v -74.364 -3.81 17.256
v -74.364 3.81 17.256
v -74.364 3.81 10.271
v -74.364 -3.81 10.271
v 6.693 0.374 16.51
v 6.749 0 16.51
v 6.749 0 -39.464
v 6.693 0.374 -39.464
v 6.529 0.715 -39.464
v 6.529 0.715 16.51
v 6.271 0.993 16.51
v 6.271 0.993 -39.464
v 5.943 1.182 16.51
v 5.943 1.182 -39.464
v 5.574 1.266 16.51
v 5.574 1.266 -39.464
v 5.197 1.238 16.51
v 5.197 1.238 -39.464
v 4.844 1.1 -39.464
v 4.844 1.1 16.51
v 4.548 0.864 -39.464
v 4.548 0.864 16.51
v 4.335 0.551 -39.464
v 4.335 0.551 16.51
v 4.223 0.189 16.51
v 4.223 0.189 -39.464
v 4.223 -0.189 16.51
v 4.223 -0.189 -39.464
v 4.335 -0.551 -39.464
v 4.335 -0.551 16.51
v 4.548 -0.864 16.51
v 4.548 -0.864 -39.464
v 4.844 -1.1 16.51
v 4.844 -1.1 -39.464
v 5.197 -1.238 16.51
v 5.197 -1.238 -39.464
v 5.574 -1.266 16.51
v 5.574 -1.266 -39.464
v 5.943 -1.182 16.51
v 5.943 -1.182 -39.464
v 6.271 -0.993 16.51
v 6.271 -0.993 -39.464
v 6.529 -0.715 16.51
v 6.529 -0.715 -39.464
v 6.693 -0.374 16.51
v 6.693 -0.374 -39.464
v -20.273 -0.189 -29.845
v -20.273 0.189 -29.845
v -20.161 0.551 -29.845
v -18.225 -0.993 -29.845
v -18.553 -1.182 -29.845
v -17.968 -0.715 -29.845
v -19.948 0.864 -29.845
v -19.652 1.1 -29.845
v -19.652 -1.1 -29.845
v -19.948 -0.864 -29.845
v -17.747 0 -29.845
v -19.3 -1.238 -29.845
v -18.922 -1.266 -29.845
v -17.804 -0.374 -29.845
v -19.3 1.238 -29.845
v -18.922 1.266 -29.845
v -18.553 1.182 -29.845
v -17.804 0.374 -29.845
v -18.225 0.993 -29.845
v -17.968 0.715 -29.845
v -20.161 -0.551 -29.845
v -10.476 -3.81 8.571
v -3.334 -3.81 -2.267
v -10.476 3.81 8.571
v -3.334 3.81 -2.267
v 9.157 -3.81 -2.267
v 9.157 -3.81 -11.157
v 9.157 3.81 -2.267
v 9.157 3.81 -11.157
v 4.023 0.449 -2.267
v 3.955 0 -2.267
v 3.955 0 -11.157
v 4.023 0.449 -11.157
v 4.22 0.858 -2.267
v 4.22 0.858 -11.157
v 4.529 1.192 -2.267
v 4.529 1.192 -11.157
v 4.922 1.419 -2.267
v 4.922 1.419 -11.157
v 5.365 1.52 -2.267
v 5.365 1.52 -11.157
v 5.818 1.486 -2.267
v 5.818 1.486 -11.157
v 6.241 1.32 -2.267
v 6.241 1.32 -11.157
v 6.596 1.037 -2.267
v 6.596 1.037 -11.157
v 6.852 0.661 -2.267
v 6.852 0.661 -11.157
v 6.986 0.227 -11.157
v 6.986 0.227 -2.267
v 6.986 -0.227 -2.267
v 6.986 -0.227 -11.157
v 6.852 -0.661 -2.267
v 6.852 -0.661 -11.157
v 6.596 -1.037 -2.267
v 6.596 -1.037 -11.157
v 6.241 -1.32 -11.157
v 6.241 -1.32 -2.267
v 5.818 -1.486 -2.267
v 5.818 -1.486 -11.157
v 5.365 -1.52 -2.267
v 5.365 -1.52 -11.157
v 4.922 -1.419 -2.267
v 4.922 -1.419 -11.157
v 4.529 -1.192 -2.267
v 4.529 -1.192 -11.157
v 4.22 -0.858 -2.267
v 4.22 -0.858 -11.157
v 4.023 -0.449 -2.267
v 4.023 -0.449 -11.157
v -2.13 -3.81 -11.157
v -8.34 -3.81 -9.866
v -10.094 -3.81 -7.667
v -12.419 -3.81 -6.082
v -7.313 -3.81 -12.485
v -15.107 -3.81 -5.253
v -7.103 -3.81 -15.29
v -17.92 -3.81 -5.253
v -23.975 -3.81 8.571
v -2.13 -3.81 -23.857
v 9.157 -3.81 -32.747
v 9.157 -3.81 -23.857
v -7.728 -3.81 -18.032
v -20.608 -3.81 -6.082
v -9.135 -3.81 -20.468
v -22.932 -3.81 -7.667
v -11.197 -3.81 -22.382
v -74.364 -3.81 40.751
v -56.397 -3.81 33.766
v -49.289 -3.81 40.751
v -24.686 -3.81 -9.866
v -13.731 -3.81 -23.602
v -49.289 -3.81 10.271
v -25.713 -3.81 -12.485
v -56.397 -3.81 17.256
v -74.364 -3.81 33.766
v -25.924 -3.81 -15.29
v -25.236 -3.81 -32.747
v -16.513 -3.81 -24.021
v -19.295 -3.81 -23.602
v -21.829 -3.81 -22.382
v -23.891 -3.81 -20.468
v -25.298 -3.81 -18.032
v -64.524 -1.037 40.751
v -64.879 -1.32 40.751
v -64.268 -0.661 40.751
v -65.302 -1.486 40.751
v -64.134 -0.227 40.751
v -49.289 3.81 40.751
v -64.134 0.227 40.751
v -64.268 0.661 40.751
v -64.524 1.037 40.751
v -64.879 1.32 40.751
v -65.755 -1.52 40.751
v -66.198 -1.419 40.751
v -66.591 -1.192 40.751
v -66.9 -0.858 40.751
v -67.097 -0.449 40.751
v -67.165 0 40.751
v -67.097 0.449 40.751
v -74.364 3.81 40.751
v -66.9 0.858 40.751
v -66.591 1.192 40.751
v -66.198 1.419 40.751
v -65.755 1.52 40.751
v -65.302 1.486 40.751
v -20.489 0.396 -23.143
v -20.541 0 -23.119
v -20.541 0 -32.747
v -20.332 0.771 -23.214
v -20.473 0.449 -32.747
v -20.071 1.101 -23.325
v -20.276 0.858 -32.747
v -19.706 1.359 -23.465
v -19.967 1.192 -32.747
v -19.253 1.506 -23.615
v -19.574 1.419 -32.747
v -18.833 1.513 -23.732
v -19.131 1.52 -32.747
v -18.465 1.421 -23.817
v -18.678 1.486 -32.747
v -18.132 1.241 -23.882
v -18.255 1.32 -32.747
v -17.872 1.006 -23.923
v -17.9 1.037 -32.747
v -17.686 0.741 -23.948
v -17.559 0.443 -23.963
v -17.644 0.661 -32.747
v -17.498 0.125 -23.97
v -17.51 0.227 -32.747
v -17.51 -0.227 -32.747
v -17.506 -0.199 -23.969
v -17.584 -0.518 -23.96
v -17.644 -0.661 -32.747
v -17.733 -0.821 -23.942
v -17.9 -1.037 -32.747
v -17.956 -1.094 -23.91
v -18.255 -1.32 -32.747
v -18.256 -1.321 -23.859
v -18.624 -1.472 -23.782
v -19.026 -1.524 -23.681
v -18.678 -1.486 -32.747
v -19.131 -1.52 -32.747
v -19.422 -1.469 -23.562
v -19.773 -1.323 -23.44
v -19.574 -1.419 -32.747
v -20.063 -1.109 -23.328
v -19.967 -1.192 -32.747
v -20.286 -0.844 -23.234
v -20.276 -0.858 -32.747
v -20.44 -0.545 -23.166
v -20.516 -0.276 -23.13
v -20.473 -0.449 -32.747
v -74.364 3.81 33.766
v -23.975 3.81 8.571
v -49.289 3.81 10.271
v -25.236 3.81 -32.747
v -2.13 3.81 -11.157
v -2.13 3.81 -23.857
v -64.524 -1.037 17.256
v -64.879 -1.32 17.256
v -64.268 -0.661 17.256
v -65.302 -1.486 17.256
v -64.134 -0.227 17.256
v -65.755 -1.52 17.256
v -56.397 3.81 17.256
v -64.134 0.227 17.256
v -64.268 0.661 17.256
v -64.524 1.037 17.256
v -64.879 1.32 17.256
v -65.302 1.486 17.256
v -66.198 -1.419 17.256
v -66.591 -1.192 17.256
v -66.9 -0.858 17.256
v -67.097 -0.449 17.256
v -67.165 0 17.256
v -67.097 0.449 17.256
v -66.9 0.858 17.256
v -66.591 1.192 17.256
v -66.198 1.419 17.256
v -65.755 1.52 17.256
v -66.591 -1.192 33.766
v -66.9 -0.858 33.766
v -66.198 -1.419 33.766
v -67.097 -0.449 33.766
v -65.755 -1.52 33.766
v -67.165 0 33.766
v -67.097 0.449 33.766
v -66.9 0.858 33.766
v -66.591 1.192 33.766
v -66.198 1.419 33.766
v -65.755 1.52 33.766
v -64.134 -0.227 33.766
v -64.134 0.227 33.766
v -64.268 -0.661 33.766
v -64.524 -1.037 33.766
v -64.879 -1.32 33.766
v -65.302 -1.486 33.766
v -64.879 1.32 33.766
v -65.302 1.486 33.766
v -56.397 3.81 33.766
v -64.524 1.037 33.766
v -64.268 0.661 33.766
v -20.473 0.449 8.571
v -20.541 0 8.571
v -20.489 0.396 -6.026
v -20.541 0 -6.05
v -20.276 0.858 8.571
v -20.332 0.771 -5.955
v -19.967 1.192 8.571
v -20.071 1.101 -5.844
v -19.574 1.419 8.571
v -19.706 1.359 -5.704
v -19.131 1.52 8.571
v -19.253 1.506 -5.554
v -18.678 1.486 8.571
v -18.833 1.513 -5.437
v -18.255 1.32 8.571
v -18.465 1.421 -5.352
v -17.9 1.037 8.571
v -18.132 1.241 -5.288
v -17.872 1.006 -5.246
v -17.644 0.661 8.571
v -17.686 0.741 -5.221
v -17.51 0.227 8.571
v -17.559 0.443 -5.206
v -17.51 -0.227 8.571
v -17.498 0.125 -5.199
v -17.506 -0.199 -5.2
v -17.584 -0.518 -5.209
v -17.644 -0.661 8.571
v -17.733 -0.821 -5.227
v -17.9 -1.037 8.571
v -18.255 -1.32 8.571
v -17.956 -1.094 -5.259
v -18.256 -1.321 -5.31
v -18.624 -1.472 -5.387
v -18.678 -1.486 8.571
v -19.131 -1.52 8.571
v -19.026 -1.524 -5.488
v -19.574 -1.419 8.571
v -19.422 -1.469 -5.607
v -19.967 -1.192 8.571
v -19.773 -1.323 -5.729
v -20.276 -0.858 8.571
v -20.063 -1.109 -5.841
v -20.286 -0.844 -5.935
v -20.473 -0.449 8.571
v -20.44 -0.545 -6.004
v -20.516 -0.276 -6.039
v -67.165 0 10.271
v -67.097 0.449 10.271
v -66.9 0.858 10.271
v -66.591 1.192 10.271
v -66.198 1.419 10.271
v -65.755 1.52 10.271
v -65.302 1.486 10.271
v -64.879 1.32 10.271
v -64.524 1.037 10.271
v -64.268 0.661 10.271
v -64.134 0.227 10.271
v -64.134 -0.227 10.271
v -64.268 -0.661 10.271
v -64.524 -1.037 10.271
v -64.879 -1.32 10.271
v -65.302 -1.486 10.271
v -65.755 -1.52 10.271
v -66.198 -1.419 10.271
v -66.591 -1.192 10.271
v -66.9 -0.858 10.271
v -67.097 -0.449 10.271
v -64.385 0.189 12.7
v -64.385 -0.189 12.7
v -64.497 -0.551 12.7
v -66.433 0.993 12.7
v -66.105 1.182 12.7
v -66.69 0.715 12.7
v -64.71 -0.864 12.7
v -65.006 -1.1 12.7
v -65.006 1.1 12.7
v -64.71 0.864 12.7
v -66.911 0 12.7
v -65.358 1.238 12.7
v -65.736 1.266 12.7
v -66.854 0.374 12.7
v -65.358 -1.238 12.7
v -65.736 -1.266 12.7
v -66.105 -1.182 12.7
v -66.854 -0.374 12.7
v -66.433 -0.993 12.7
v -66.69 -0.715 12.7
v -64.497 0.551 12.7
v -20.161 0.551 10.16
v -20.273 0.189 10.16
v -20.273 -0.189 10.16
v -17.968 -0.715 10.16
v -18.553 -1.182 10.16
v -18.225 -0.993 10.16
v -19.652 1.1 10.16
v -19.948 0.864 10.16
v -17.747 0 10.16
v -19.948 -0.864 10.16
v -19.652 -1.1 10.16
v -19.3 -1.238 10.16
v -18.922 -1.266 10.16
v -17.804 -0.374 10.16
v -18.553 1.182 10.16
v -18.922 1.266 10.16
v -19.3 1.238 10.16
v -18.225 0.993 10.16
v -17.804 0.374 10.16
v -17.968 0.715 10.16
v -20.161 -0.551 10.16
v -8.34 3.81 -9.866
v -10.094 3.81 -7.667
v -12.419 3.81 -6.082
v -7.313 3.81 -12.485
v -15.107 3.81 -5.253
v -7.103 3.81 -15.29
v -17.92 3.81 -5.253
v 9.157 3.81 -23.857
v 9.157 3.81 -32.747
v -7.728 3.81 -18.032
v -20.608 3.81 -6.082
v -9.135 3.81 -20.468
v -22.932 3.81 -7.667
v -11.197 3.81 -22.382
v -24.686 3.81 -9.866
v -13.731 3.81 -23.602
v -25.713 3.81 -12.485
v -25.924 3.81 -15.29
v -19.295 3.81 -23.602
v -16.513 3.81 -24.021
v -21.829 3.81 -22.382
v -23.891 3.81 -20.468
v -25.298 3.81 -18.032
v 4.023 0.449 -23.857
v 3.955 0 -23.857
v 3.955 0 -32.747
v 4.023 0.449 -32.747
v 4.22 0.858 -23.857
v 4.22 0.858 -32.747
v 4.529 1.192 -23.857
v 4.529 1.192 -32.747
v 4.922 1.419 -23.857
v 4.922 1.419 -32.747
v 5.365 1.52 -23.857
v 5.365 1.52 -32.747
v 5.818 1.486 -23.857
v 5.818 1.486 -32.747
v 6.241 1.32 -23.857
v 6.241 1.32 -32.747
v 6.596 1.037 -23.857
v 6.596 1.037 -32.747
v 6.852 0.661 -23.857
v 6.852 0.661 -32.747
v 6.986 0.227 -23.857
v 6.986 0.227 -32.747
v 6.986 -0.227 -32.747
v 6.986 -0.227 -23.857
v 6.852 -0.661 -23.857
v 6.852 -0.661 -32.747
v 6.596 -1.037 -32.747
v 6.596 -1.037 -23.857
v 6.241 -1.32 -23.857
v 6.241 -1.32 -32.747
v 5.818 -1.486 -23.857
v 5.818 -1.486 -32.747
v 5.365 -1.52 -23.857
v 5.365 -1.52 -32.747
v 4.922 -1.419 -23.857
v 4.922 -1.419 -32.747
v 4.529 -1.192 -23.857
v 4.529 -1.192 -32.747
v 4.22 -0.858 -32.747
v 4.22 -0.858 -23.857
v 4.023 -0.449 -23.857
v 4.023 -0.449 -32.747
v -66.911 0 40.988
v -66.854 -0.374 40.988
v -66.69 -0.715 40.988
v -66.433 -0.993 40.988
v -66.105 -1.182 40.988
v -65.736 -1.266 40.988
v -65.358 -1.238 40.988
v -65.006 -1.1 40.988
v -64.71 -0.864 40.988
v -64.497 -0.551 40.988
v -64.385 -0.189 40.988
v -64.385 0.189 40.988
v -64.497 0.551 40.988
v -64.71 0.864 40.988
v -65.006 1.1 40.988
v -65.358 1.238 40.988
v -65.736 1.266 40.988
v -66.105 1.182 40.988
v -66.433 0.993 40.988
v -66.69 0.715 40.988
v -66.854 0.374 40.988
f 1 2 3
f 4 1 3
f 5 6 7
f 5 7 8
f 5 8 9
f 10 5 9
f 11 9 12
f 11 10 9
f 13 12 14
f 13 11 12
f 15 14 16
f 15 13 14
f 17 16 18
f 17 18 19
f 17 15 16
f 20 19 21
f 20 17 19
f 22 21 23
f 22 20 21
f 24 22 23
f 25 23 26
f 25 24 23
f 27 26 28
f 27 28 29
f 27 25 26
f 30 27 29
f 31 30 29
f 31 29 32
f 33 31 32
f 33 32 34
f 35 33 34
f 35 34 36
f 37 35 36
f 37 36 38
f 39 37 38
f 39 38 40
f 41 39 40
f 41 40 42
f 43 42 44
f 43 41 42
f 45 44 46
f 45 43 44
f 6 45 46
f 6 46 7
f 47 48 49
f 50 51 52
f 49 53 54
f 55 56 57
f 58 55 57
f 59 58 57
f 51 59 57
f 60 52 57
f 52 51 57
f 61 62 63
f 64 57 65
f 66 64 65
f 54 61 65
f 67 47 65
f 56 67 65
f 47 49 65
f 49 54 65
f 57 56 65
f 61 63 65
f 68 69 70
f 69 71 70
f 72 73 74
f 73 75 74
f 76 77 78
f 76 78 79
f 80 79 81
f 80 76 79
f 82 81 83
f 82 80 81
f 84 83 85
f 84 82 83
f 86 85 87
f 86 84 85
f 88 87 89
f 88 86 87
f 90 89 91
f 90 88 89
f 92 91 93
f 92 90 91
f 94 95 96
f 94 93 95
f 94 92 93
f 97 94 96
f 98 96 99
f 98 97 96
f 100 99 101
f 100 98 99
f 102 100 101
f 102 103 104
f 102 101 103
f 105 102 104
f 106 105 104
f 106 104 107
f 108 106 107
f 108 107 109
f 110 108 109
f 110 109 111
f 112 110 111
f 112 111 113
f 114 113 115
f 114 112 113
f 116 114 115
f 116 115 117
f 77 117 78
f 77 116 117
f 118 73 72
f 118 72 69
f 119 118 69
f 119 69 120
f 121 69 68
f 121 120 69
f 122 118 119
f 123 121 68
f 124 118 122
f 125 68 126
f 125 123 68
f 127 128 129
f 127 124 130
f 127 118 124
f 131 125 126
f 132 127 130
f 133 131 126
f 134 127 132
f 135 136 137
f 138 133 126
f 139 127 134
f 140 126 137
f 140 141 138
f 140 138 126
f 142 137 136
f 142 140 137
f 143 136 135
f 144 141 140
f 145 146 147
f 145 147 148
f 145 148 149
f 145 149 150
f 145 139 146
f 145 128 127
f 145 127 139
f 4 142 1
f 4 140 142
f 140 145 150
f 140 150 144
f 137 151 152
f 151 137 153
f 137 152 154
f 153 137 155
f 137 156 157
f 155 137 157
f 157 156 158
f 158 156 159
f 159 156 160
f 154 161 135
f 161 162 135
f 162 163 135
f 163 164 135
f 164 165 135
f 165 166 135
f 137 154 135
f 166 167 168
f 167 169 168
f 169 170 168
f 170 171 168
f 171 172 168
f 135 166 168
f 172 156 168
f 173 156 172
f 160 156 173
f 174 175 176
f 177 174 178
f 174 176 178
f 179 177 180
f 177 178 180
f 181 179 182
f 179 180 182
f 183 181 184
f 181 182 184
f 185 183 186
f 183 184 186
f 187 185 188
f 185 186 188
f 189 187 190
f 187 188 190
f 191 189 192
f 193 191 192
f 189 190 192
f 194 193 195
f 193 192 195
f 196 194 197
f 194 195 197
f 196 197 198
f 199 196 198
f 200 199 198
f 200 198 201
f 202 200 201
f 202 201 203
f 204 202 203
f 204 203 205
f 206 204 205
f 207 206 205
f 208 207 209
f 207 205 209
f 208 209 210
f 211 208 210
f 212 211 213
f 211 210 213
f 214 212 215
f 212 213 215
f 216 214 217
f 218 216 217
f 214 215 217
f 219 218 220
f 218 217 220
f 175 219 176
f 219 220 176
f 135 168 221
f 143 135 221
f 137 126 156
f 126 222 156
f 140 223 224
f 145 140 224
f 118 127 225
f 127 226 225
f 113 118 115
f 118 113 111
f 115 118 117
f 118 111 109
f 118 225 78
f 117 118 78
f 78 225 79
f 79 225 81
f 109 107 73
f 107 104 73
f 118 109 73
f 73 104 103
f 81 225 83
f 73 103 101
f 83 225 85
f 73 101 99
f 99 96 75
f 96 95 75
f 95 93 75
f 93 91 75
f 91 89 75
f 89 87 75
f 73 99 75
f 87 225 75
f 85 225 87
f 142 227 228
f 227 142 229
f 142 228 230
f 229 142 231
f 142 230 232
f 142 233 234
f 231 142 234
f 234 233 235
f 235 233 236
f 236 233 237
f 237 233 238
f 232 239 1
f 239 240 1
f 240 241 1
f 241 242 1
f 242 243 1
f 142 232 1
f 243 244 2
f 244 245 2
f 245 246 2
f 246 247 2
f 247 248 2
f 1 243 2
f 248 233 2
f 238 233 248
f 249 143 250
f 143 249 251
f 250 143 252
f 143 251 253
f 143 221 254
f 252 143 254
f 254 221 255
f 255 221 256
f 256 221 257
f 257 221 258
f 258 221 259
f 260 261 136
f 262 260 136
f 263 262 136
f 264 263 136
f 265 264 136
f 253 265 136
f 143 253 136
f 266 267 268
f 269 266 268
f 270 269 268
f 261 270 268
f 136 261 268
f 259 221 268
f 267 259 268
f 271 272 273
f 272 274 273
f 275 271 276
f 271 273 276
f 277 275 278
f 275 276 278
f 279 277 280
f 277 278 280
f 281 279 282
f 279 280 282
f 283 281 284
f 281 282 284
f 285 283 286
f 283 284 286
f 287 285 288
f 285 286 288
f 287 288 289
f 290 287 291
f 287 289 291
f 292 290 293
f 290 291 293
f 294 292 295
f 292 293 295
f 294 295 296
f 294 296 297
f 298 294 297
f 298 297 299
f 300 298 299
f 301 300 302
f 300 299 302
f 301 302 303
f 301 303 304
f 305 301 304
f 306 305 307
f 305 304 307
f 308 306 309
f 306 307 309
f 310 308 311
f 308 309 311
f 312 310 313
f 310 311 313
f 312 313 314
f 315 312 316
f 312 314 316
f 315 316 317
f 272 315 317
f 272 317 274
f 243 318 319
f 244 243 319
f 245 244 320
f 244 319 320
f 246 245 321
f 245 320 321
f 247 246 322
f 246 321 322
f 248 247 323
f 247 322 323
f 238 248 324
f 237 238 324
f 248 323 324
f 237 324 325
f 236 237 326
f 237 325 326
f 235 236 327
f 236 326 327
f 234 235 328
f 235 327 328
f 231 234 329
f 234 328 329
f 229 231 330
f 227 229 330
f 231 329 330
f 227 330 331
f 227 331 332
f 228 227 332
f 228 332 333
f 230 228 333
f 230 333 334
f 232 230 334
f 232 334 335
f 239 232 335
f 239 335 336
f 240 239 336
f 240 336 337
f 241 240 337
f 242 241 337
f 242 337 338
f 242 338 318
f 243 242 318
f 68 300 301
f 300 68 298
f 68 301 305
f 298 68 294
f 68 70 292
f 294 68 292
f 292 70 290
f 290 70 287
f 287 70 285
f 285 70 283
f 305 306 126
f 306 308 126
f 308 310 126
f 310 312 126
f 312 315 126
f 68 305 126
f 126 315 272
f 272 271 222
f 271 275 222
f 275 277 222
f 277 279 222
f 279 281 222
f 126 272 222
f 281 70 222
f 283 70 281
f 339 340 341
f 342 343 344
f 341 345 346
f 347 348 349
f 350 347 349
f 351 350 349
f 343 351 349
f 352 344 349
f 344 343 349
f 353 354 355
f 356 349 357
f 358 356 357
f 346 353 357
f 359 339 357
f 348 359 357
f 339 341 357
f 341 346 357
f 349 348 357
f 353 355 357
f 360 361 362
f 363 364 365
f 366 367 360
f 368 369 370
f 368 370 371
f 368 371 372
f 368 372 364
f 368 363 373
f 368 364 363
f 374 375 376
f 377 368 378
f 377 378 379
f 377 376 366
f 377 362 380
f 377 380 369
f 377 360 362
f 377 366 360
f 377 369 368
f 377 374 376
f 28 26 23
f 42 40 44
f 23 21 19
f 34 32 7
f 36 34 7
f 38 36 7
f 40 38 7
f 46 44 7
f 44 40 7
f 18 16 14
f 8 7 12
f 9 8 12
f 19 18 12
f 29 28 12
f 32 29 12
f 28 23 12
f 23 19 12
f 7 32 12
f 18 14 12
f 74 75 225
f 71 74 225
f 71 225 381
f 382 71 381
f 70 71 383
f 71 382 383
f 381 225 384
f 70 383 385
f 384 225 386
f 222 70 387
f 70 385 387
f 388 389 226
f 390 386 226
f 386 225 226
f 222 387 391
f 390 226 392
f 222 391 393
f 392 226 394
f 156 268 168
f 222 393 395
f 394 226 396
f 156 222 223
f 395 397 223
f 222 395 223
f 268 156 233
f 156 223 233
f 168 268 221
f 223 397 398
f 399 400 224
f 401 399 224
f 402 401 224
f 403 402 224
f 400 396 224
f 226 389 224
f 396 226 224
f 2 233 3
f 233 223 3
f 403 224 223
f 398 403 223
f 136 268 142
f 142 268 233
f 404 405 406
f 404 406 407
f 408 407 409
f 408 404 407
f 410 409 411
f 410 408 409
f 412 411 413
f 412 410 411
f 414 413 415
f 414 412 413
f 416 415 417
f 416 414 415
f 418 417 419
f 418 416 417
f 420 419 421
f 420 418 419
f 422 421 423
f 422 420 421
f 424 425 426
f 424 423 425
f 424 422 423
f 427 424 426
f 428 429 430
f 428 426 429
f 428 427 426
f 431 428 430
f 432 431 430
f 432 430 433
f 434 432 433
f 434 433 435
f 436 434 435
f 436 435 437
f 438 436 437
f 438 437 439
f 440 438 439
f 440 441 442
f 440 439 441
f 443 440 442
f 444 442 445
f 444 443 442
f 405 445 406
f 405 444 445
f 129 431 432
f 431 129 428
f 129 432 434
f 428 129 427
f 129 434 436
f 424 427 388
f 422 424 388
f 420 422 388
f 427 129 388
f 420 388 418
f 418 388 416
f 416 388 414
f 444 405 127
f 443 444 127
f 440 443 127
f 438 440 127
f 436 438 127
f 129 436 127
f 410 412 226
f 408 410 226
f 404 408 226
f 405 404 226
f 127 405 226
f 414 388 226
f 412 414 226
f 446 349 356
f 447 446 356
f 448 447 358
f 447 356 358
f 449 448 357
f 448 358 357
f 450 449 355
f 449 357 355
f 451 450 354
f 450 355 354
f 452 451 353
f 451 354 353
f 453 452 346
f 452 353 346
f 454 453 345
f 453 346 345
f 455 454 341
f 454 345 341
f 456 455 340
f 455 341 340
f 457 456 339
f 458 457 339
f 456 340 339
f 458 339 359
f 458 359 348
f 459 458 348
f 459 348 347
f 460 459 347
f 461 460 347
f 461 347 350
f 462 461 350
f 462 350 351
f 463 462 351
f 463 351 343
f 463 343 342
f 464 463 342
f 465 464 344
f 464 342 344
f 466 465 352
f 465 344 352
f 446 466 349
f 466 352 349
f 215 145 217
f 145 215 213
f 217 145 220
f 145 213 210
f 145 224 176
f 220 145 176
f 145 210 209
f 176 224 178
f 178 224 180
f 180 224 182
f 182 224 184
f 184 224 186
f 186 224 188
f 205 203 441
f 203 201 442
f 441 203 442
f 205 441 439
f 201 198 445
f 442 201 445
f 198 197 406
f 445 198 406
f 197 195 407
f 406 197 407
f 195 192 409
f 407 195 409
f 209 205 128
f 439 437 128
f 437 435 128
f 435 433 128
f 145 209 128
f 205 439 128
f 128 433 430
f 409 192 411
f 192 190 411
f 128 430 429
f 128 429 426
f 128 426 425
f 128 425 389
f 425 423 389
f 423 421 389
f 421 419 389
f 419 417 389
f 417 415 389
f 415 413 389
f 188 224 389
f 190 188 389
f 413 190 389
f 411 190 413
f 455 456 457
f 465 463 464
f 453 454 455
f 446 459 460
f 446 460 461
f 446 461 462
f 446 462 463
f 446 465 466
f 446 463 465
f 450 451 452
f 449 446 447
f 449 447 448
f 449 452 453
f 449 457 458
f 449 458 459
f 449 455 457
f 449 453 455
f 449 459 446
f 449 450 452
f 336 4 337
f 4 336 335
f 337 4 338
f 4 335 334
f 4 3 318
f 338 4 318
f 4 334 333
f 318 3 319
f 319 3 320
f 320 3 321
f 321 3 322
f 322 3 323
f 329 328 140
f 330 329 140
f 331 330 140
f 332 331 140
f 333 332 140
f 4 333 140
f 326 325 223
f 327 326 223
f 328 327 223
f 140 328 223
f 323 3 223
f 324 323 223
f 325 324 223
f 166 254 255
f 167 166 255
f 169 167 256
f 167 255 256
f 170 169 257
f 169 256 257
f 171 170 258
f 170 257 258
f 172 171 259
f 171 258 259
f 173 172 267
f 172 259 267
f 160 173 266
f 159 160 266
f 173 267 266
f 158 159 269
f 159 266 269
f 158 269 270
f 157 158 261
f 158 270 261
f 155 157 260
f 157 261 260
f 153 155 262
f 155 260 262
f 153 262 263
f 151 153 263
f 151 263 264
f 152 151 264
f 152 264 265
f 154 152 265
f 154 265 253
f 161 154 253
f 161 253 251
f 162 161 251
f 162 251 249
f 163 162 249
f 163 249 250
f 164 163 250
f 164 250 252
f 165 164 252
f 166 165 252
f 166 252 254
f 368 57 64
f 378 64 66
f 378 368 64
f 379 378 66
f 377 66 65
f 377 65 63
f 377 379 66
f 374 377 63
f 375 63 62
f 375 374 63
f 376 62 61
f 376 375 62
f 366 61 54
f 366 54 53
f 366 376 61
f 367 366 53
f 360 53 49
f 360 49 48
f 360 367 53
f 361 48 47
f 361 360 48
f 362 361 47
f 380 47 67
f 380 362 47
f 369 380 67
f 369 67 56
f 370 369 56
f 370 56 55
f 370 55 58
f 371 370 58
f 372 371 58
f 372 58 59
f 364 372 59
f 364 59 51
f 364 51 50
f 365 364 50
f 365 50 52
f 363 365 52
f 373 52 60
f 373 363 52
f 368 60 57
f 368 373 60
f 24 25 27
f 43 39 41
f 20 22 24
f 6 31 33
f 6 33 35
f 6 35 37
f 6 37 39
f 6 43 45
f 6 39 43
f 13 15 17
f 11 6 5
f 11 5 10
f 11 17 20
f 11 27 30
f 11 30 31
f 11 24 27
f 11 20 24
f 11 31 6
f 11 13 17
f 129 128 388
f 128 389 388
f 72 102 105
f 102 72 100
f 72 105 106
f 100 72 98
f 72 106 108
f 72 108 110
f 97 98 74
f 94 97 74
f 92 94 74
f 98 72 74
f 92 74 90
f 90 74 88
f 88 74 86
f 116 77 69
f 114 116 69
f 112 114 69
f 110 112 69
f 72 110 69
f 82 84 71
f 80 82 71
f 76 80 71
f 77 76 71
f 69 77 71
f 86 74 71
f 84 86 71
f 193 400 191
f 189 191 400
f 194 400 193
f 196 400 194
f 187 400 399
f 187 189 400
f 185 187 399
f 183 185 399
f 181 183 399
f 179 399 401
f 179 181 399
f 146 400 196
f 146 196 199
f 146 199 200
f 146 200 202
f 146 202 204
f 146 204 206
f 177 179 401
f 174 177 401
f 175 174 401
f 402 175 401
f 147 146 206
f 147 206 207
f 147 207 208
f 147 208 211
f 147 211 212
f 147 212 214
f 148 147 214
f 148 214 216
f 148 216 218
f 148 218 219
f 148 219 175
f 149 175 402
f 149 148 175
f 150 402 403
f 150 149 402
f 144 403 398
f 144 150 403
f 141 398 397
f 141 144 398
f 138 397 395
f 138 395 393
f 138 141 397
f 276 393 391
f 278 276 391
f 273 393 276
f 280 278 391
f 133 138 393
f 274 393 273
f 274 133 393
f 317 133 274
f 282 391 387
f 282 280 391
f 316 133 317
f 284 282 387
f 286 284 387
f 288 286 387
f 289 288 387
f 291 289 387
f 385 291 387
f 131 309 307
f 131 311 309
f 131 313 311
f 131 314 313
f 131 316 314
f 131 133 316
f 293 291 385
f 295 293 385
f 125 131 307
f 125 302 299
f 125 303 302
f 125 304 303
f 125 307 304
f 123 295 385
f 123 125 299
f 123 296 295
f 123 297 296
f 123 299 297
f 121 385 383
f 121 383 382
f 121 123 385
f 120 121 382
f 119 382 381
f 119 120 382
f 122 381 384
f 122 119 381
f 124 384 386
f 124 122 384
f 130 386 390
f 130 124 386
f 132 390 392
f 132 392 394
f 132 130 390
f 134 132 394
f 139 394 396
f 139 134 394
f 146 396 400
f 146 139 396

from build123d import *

# Parameters (mm, degrees)
SKETCH21_R         = 9.436937722
EXTRUDE1_DEPTH     = 3.81
SKETCH22_R         = 1.524
CUT_EXTRUDE1_DEPTH = 91.7575
EXTRUDE2_START     = 10.16
SKETCH24_R         = 1.27
EXTRUDE2_DEPTH     = 40.005
EXTRUDE3_START     = 16.51
SKETCH24_3_R       = 1.27
EXTRUDE3_DEPTH     = 55.974
EXTRUDE4_START     = 12.7
SKETCH24_4_R       = 1.27
EXTRUDE4_DEPTH     = 28.288


with BuildPart() as part:
    # Sketch21 → Extrude1 (new, symmetric)
    with BuildSketch(Plane(origin=(0, 0, 0), x_dir=(1, 0, 0), z_dir=(0, 1, 0))):
        Polygon((-25.235563568, 32.747037143), (9.156953986, 32.747037143), (9.156953986, 23.857037143), (-2.129946458, 23.857037143), (-2.129946458, 11.157037143), (9.156953986, 11.157037143), (9.156953986, 2.267037143), (-3.333838084, 2.267037143), (-10.476047059, -8.570931995), (-23.974524178, -8.570931995), (-49.288929698, -40.750763377), (-74.36445975, -40.750763377), (-74.36445975, -33.765763377), (-56.396654351, -33.765763377), (-56.396654351, -17.255763377), (-74.36445975, -17.255763377), (-74.36445975, -10.270763377), (-49.288929698, -10.270763377), align=None)
        with Locations((-16.513065154, 14.584522986)):
            Circle(SKETCH21_R, mode=Mode.SUBTRACT)
    extrude(amount=EXTRUDE1_DEPTH, both=True)

    # Sketch22 → Cut-Extrude1 (cut, symmetric)
    with BuildSketch(Plane(origin=(0, 0, 0), x_dir=(-1, 0, 0), z_dir=(0, 0, -1))):
        with Locations((-5.47919097, 0)):
            Circle(SKETCH22_R)
        with Locations((65.64080903, 0)):
            Circle(SKETCH22_R)
        with Locations((19.01714802, 0)):
            Circle(SKETCH22_R)
    extrude(amount=CUT_EXTRUDE1_DEPTH, both=True, mode=Mode.SUBTRACT)


with BuildPart() as body_2:
    # Sketch24 → Extrude2 (new body)
    with BuildSketch(Plane.XY.offset(EXTRUDE2_START)):
        with Locations((-19.01714802, 0)):
            Circle(SKETCH24_R)
    extrude(amount=-EXTRUDE2_DEPTH)


with BuildPart() as body_3:
    # Sketch24<3> → Extrude3 (new body)
    with BuildSketch(Plane.XY.offset(EXTRUDE3_START)):
        with Locations((5.47919097, 0)):
            Circle(SKETCH24_3_R)
    extrude(amount=-EXTRUDE3_DEPTH)


with BuildPart() as body_4:
    # Sketch24<4> → Extrude4 (new body)
    with BuildSketch(Plane.XY.offset(EXTRUDE4_START)):
        with Locations((-65.64080903, 0)):
            Circle(SKETCH24_4_R)
    extrude(amount=EXTRUDE4_DEPTH)


solid = Compound([part.part, body_2.part, body_3.part, body_4.part])
